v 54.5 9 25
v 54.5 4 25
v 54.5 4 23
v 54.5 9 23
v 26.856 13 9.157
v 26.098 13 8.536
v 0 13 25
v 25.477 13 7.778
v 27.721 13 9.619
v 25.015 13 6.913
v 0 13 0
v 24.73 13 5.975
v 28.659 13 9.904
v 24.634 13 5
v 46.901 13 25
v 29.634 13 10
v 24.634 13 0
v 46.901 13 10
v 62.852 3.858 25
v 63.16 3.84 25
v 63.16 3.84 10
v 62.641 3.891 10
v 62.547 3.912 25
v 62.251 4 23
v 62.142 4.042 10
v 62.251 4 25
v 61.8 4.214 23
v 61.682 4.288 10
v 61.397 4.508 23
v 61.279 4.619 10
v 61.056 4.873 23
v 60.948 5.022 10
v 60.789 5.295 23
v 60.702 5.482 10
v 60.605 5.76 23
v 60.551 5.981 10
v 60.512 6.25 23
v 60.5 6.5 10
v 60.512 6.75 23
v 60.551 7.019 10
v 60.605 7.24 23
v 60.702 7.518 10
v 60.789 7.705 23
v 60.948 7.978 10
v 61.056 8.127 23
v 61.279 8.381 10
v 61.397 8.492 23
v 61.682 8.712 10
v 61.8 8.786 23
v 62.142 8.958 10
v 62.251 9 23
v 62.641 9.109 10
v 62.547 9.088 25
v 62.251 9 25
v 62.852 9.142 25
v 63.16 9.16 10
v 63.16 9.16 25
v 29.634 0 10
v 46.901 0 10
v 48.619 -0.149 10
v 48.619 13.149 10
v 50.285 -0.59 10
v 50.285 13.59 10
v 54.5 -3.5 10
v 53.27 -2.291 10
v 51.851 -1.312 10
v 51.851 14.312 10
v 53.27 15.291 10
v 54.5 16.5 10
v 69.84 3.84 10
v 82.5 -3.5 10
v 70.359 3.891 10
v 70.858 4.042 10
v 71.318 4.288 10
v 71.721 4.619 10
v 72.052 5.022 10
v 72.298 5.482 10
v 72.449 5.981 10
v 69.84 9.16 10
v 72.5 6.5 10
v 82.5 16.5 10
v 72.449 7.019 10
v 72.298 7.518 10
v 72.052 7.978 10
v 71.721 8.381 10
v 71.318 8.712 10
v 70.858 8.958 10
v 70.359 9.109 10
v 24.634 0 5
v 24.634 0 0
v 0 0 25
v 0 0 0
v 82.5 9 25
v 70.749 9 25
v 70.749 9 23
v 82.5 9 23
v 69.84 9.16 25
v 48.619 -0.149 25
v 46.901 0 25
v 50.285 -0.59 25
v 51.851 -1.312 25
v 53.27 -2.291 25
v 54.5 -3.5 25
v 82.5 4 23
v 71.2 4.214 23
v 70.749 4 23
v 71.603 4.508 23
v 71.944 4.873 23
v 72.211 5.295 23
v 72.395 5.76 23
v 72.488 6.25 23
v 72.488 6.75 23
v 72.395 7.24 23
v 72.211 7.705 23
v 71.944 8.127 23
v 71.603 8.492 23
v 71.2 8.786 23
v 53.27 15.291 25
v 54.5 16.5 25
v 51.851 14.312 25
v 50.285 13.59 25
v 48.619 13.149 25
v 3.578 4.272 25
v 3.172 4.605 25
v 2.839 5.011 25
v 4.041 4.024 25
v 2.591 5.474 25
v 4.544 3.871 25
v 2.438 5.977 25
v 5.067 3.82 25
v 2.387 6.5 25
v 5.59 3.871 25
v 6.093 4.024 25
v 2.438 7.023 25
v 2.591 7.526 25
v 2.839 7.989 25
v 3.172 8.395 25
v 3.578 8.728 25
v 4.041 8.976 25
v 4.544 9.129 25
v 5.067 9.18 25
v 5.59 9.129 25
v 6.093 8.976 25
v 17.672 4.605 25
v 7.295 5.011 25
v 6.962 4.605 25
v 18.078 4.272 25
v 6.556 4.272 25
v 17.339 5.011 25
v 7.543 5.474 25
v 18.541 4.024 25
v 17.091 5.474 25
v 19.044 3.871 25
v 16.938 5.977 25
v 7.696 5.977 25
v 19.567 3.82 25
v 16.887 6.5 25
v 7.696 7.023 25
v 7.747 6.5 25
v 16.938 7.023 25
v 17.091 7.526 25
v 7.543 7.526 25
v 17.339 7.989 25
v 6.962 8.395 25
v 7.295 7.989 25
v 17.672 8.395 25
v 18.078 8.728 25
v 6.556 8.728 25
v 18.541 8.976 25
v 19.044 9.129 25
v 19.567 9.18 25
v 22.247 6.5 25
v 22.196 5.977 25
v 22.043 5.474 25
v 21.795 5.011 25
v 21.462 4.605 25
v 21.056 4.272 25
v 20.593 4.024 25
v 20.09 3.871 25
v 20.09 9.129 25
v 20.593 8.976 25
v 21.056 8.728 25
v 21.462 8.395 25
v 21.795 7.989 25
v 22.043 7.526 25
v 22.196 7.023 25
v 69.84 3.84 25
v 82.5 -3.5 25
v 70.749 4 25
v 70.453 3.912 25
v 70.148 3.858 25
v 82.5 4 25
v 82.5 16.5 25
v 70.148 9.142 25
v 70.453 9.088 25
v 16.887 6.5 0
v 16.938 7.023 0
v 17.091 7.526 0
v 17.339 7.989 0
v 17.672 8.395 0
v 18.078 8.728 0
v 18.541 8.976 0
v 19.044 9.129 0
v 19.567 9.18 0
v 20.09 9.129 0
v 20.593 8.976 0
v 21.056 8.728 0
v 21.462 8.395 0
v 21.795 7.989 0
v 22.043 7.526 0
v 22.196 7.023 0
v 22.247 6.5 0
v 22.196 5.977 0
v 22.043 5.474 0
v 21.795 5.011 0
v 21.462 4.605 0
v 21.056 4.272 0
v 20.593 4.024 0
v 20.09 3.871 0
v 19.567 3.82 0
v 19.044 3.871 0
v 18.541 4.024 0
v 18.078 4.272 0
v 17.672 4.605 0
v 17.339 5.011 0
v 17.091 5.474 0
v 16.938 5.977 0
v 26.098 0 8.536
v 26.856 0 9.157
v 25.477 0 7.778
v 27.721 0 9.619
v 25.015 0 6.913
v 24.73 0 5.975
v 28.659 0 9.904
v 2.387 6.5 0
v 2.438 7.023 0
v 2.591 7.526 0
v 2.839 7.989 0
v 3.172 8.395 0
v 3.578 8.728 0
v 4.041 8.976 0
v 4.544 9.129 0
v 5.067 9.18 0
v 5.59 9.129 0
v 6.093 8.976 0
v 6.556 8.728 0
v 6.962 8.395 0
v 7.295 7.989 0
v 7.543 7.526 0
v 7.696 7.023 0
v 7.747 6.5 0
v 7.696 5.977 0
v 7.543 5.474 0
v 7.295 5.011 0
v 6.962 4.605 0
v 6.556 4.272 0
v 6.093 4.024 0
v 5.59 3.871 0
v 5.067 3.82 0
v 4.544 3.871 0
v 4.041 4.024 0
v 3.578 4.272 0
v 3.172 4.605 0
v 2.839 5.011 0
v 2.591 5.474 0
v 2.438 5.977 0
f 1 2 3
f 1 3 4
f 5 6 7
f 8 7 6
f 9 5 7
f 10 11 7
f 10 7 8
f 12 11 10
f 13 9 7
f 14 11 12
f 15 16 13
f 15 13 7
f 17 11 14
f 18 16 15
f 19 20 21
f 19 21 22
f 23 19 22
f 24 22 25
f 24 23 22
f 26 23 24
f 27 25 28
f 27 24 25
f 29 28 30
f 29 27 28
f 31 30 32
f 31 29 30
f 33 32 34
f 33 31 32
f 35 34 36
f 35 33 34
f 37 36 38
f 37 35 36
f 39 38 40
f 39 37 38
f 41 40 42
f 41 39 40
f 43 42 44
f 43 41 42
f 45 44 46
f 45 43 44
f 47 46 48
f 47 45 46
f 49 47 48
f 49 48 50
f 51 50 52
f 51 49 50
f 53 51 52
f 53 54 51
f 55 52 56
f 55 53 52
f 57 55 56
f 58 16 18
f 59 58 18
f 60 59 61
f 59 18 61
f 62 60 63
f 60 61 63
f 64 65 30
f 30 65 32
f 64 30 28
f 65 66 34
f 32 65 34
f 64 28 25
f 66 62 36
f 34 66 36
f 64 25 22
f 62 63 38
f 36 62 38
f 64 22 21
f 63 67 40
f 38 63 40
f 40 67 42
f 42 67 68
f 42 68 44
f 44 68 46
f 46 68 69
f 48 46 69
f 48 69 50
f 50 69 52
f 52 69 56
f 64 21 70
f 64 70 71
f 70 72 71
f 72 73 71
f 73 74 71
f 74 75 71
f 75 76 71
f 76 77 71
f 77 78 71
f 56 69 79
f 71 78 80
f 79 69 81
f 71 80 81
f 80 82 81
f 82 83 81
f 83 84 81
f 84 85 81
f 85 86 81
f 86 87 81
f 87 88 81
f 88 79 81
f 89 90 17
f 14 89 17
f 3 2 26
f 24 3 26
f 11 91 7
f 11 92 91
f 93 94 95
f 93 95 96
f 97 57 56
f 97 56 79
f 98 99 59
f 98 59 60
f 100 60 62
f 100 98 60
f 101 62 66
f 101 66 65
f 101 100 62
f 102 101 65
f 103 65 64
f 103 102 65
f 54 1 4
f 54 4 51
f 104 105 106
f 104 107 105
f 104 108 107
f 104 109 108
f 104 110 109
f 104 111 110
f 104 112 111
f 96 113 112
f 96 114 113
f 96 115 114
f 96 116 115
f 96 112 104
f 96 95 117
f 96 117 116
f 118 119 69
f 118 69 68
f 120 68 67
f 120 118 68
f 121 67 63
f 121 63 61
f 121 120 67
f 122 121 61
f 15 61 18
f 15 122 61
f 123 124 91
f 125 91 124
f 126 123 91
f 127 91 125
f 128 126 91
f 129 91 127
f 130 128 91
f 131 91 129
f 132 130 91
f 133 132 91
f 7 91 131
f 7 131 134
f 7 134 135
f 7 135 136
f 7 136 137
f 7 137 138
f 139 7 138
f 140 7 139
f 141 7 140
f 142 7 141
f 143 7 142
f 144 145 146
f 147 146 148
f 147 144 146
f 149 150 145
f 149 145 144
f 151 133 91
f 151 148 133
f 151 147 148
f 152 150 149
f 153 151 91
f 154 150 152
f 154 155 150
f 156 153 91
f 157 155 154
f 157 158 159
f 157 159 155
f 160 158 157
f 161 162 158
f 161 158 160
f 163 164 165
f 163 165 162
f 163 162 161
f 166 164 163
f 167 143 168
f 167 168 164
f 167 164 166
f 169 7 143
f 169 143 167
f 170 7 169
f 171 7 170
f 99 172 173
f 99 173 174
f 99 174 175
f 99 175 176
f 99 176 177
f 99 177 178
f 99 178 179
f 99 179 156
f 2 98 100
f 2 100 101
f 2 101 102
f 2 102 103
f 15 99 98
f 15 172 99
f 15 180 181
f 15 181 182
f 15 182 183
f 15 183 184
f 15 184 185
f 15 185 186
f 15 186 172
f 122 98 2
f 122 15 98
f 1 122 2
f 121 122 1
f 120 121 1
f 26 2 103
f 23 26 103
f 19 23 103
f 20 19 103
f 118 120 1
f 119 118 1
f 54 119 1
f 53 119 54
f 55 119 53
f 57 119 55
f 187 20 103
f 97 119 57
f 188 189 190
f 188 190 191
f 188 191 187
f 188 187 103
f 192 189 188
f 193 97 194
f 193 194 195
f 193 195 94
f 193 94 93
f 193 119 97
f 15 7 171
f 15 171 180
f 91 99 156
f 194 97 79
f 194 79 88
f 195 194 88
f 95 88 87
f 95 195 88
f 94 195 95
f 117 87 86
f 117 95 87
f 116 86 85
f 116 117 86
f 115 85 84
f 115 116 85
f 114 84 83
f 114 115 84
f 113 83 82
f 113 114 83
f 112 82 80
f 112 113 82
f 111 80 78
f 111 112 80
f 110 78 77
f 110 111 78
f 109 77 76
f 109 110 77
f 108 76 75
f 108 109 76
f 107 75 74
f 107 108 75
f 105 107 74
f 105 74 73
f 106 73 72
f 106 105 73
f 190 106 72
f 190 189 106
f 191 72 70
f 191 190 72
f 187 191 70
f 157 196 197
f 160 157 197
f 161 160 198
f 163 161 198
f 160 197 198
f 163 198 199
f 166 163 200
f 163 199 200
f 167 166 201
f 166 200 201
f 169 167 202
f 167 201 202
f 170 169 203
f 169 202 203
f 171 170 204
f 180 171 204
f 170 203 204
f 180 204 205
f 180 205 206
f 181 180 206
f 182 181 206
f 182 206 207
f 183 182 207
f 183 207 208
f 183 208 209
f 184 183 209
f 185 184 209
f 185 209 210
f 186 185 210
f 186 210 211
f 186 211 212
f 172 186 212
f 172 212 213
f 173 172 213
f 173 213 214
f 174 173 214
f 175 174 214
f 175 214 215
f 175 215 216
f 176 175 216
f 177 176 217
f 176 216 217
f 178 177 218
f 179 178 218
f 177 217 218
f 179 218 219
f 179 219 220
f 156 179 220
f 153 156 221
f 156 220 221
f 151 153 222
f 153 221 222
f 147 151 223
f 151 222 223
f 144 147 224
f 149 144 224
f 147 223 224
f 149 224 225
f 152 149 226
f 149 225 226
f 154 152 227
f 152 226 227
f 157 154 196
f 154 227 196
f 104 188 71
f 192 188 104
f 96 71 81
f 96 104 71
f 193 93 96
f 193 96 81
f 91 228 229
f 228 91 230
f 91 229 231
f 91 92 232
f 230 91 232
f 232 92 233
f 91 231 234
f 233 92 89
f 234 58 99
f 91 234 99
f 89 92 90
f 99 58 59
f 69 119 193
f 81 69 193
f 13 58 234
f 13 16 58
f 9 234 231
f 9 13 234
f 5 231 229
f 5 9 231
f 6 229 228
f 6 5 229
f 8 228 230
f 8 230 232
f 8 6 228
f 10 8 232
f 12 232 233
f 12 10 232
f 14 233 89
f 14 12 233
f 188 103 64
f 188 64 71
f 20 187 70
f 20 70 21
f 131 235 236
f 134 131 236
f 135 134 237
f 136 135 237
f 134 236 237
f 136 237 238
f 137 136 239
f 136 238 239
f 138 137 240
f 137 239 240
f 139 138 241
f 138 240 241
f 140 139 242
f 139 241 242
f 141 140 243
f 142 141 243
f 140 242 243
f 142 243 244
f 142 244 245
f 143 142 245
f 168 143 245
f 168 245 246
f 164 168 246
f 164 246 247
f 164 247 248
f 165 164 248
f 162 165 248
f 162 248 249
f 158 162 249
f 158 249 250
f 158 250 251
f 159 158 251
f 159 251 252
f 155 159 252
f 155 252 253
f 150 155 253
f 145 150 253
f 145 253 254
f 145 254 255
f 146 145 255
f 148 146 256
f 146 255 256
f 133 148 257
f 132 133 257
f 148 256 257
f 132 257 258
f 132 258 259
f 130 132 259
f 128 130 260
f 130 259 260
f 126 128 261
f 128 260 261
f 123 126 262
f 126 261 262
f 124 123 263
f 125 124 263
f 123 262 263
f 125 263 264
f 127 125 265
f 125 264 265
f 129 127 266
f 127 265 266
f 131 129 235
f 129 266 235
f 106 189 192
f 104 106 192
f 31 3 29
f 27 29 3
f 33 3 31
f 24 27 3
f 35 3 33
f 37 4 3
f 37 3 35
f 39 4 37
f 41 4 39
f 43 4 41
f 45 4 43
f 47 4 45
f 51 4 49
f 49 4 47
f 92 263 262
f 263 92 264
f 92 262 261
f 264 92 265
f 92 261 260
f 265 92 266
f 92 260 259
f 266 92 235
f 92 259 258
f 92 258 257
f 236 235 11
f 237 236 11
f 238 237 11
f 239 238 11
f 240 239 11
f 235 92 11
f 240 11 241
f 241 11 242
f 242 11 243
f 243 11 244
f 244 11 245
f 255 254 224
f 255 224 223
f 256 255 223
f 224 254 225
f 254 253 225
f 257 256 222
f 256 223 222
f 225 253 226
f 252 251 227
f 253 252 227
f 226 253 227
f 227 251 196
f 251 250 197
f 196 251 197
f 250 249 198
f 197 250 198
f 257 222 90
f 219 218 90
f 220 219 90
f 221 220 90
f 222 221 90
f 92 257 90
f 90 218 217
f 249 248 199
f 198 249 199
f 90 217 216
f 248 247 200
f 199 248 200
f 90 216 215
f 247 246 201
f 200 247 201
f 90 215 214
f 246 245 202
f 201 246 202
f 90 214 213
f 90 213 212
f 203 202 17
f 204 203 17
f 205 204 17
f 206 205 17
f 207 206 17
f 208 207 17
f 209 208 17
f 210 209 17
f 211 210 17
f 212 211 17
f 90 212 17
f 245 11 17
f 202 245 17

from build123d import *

# Parameters (mm, degrees)
SKETCH1_W           = 24.634
SKETCH1_H           = 13
BOSS_EXTRUDE1_DEPTH = 10
SKETCH4_W           = 82.5
SKETCH4_H           = 13
BOSS_EXTRUDE4_DEPTH = 15
SKETCH5_W           = 28
SKETCH5_H           = 3.5
BOSS_EXTRUDE5_DEPTH = 15
CUT_EXTRUDE1_DEPTH  = 88.769584709
SKETCH7_W           = 28
SKETCH7_H           = 5
CUT_EXTRUDE2_DEPTH  = 2
SKETCH11_R          = 2.68
CUT_EXTRUDE3_DEPTH  = 88.769584709
FILLET1_R           = 10
FILLET2_R           = 5


with BuildPart() as part:
    # Sketch1 → Boss-Extrude1 (new body)
    with BuildSketch(Plane.XY):
        with Locations((12.317, 6.5)):
            Rectangle(SKETCH1_W, SKETCH1_H)
    extrude(amount=BOSS_EXTRUDE1_DEPTH)

    # Sketch4 → Boss-Extrude4 (add)
    with BuildSketch(Plane.XY.offset(10)):
        with Locations((41.25, 6.5)):
            Rectangle(SKETCH4_W, SKETCH4_H)
    extrude(amount=BOSS_EXTRUDE4_DEPTH)

    # Sketch5 → Boss-Extrude5 (add)
    with BuildSketch(Plane.XY.offset(25)):
        with Locations((68.5, -1.75)):
            Rectangle(SKETCH5_W, SKETCH5_H)
        with Locations((68.5, 14.75)):
            Rectangle(SKETCH5_W, SKETCH5_H)
    extrude(amount=-BOSS_EXTRUDE5_DEPTH)

    # Sketch6 → Cut-Extrude1 (cut, through all)
    with BuildSketch(Plane.XY.offset(25)):
        with BuildLine():
            Line((63.16, 9.16), (69.84, 9.16))
            ThreePointArc((69.84, 9.16), (72.5, 6.5), (69.84, 3.84))
            Line((69.84, 3.84), (63.16, 3.84))
            ThreePointArc((63.16, 3.84), (60.5, 6.5), (63.16, 9.16))
        make_face()
    extrude(amount=-CUT_EXTRUDE1_DEPTH, mode=Mode.SUBTRACT)

    # Sketch7 → Cut-Extrude2 (cut)
    with BuildSketch(Plane.XY.offset(25)):
        with Locations((68.5, 6.5)):
            Rectangle(SKETCH7_W, SKETCH7_H)
    extrude(amount=-CUT_EXTRUDE2_DEPTH, mode=Mode.SUBTRACT)

    # Sketch11 → Cut-Extrude3 (cut, through all)
    with BuildSketch(Plane(origin=(0, 0, 0), x_dir=(-1, 0, 0), z_dir=(0, 0, -1))):
        with Locations((-5.067, 6.5)):
            Circle(SKETCH11_R)
        with Locations((-19.567, 6.5)):
            Circle(SKETCH11_R)
    extrude(amount=-CUT_EXTRUDE3_DEPTH, mode=Mode.SUBTRACT)

    # Fillet1
    # the kernel refuses this fillet: 10 mm, written as the material it adds along each edge
    with BuildSketch(Plane(origin=(54.5, 13, 25), x_dir=(-1, 0, 0), z_dir=(0, 0, -1))) as fillet1_piece_1:
        with BuildLine():
            CenterArc((7.599342077, 10), FILLET1_R, 220.541601874, 49.458398126)
            Line((0, 3.5), (-0.151986842, 3.37))
            ThreePointArc((-0.151986842, 3.37), (-0.2, 1.75), (-0.2, 0))
            Line((-0.2, 0), (0, -0.2))
            Line((0, -0.2), (7.599342077, -0.2))
            Line((7.599342077, -0.2), (7.599342077, 0))
        make_face()
    extrude(amount=15)
    with BuildSketch(Plane(origin=(54.5, 0, 25), x_dir=(-1, 0, 0), z_dir=(0, 0, -1))) as fillet1_piece_2:
        with BuildLine():
            CenterArc((7.599342077, -10), FILLET1_R, 90, 49.458398126)
            Line((0, -3.5), (-0.151986842, -3.37))
            ThreePointArc((-0.151986842, -3.37), (-0.2, -1.75), (-0.2, 0))
            Line((-0.2, 0), (0, 0.2))
            Line((0, 0.2), (7.599342077, 0.2))
            Line((7.599342077, 0.2), (7.599342077, 0))
        make_face()
    extrude(amount=15)

    # Fillet2
    fillet2_edges = [part.edges().sort_by_distance(p)[0] for p in [
        (24.634, 6.5, 10),
    ]]
    fillet(fillet2_edges, radius=FILLET2_R)


solid = part.part
